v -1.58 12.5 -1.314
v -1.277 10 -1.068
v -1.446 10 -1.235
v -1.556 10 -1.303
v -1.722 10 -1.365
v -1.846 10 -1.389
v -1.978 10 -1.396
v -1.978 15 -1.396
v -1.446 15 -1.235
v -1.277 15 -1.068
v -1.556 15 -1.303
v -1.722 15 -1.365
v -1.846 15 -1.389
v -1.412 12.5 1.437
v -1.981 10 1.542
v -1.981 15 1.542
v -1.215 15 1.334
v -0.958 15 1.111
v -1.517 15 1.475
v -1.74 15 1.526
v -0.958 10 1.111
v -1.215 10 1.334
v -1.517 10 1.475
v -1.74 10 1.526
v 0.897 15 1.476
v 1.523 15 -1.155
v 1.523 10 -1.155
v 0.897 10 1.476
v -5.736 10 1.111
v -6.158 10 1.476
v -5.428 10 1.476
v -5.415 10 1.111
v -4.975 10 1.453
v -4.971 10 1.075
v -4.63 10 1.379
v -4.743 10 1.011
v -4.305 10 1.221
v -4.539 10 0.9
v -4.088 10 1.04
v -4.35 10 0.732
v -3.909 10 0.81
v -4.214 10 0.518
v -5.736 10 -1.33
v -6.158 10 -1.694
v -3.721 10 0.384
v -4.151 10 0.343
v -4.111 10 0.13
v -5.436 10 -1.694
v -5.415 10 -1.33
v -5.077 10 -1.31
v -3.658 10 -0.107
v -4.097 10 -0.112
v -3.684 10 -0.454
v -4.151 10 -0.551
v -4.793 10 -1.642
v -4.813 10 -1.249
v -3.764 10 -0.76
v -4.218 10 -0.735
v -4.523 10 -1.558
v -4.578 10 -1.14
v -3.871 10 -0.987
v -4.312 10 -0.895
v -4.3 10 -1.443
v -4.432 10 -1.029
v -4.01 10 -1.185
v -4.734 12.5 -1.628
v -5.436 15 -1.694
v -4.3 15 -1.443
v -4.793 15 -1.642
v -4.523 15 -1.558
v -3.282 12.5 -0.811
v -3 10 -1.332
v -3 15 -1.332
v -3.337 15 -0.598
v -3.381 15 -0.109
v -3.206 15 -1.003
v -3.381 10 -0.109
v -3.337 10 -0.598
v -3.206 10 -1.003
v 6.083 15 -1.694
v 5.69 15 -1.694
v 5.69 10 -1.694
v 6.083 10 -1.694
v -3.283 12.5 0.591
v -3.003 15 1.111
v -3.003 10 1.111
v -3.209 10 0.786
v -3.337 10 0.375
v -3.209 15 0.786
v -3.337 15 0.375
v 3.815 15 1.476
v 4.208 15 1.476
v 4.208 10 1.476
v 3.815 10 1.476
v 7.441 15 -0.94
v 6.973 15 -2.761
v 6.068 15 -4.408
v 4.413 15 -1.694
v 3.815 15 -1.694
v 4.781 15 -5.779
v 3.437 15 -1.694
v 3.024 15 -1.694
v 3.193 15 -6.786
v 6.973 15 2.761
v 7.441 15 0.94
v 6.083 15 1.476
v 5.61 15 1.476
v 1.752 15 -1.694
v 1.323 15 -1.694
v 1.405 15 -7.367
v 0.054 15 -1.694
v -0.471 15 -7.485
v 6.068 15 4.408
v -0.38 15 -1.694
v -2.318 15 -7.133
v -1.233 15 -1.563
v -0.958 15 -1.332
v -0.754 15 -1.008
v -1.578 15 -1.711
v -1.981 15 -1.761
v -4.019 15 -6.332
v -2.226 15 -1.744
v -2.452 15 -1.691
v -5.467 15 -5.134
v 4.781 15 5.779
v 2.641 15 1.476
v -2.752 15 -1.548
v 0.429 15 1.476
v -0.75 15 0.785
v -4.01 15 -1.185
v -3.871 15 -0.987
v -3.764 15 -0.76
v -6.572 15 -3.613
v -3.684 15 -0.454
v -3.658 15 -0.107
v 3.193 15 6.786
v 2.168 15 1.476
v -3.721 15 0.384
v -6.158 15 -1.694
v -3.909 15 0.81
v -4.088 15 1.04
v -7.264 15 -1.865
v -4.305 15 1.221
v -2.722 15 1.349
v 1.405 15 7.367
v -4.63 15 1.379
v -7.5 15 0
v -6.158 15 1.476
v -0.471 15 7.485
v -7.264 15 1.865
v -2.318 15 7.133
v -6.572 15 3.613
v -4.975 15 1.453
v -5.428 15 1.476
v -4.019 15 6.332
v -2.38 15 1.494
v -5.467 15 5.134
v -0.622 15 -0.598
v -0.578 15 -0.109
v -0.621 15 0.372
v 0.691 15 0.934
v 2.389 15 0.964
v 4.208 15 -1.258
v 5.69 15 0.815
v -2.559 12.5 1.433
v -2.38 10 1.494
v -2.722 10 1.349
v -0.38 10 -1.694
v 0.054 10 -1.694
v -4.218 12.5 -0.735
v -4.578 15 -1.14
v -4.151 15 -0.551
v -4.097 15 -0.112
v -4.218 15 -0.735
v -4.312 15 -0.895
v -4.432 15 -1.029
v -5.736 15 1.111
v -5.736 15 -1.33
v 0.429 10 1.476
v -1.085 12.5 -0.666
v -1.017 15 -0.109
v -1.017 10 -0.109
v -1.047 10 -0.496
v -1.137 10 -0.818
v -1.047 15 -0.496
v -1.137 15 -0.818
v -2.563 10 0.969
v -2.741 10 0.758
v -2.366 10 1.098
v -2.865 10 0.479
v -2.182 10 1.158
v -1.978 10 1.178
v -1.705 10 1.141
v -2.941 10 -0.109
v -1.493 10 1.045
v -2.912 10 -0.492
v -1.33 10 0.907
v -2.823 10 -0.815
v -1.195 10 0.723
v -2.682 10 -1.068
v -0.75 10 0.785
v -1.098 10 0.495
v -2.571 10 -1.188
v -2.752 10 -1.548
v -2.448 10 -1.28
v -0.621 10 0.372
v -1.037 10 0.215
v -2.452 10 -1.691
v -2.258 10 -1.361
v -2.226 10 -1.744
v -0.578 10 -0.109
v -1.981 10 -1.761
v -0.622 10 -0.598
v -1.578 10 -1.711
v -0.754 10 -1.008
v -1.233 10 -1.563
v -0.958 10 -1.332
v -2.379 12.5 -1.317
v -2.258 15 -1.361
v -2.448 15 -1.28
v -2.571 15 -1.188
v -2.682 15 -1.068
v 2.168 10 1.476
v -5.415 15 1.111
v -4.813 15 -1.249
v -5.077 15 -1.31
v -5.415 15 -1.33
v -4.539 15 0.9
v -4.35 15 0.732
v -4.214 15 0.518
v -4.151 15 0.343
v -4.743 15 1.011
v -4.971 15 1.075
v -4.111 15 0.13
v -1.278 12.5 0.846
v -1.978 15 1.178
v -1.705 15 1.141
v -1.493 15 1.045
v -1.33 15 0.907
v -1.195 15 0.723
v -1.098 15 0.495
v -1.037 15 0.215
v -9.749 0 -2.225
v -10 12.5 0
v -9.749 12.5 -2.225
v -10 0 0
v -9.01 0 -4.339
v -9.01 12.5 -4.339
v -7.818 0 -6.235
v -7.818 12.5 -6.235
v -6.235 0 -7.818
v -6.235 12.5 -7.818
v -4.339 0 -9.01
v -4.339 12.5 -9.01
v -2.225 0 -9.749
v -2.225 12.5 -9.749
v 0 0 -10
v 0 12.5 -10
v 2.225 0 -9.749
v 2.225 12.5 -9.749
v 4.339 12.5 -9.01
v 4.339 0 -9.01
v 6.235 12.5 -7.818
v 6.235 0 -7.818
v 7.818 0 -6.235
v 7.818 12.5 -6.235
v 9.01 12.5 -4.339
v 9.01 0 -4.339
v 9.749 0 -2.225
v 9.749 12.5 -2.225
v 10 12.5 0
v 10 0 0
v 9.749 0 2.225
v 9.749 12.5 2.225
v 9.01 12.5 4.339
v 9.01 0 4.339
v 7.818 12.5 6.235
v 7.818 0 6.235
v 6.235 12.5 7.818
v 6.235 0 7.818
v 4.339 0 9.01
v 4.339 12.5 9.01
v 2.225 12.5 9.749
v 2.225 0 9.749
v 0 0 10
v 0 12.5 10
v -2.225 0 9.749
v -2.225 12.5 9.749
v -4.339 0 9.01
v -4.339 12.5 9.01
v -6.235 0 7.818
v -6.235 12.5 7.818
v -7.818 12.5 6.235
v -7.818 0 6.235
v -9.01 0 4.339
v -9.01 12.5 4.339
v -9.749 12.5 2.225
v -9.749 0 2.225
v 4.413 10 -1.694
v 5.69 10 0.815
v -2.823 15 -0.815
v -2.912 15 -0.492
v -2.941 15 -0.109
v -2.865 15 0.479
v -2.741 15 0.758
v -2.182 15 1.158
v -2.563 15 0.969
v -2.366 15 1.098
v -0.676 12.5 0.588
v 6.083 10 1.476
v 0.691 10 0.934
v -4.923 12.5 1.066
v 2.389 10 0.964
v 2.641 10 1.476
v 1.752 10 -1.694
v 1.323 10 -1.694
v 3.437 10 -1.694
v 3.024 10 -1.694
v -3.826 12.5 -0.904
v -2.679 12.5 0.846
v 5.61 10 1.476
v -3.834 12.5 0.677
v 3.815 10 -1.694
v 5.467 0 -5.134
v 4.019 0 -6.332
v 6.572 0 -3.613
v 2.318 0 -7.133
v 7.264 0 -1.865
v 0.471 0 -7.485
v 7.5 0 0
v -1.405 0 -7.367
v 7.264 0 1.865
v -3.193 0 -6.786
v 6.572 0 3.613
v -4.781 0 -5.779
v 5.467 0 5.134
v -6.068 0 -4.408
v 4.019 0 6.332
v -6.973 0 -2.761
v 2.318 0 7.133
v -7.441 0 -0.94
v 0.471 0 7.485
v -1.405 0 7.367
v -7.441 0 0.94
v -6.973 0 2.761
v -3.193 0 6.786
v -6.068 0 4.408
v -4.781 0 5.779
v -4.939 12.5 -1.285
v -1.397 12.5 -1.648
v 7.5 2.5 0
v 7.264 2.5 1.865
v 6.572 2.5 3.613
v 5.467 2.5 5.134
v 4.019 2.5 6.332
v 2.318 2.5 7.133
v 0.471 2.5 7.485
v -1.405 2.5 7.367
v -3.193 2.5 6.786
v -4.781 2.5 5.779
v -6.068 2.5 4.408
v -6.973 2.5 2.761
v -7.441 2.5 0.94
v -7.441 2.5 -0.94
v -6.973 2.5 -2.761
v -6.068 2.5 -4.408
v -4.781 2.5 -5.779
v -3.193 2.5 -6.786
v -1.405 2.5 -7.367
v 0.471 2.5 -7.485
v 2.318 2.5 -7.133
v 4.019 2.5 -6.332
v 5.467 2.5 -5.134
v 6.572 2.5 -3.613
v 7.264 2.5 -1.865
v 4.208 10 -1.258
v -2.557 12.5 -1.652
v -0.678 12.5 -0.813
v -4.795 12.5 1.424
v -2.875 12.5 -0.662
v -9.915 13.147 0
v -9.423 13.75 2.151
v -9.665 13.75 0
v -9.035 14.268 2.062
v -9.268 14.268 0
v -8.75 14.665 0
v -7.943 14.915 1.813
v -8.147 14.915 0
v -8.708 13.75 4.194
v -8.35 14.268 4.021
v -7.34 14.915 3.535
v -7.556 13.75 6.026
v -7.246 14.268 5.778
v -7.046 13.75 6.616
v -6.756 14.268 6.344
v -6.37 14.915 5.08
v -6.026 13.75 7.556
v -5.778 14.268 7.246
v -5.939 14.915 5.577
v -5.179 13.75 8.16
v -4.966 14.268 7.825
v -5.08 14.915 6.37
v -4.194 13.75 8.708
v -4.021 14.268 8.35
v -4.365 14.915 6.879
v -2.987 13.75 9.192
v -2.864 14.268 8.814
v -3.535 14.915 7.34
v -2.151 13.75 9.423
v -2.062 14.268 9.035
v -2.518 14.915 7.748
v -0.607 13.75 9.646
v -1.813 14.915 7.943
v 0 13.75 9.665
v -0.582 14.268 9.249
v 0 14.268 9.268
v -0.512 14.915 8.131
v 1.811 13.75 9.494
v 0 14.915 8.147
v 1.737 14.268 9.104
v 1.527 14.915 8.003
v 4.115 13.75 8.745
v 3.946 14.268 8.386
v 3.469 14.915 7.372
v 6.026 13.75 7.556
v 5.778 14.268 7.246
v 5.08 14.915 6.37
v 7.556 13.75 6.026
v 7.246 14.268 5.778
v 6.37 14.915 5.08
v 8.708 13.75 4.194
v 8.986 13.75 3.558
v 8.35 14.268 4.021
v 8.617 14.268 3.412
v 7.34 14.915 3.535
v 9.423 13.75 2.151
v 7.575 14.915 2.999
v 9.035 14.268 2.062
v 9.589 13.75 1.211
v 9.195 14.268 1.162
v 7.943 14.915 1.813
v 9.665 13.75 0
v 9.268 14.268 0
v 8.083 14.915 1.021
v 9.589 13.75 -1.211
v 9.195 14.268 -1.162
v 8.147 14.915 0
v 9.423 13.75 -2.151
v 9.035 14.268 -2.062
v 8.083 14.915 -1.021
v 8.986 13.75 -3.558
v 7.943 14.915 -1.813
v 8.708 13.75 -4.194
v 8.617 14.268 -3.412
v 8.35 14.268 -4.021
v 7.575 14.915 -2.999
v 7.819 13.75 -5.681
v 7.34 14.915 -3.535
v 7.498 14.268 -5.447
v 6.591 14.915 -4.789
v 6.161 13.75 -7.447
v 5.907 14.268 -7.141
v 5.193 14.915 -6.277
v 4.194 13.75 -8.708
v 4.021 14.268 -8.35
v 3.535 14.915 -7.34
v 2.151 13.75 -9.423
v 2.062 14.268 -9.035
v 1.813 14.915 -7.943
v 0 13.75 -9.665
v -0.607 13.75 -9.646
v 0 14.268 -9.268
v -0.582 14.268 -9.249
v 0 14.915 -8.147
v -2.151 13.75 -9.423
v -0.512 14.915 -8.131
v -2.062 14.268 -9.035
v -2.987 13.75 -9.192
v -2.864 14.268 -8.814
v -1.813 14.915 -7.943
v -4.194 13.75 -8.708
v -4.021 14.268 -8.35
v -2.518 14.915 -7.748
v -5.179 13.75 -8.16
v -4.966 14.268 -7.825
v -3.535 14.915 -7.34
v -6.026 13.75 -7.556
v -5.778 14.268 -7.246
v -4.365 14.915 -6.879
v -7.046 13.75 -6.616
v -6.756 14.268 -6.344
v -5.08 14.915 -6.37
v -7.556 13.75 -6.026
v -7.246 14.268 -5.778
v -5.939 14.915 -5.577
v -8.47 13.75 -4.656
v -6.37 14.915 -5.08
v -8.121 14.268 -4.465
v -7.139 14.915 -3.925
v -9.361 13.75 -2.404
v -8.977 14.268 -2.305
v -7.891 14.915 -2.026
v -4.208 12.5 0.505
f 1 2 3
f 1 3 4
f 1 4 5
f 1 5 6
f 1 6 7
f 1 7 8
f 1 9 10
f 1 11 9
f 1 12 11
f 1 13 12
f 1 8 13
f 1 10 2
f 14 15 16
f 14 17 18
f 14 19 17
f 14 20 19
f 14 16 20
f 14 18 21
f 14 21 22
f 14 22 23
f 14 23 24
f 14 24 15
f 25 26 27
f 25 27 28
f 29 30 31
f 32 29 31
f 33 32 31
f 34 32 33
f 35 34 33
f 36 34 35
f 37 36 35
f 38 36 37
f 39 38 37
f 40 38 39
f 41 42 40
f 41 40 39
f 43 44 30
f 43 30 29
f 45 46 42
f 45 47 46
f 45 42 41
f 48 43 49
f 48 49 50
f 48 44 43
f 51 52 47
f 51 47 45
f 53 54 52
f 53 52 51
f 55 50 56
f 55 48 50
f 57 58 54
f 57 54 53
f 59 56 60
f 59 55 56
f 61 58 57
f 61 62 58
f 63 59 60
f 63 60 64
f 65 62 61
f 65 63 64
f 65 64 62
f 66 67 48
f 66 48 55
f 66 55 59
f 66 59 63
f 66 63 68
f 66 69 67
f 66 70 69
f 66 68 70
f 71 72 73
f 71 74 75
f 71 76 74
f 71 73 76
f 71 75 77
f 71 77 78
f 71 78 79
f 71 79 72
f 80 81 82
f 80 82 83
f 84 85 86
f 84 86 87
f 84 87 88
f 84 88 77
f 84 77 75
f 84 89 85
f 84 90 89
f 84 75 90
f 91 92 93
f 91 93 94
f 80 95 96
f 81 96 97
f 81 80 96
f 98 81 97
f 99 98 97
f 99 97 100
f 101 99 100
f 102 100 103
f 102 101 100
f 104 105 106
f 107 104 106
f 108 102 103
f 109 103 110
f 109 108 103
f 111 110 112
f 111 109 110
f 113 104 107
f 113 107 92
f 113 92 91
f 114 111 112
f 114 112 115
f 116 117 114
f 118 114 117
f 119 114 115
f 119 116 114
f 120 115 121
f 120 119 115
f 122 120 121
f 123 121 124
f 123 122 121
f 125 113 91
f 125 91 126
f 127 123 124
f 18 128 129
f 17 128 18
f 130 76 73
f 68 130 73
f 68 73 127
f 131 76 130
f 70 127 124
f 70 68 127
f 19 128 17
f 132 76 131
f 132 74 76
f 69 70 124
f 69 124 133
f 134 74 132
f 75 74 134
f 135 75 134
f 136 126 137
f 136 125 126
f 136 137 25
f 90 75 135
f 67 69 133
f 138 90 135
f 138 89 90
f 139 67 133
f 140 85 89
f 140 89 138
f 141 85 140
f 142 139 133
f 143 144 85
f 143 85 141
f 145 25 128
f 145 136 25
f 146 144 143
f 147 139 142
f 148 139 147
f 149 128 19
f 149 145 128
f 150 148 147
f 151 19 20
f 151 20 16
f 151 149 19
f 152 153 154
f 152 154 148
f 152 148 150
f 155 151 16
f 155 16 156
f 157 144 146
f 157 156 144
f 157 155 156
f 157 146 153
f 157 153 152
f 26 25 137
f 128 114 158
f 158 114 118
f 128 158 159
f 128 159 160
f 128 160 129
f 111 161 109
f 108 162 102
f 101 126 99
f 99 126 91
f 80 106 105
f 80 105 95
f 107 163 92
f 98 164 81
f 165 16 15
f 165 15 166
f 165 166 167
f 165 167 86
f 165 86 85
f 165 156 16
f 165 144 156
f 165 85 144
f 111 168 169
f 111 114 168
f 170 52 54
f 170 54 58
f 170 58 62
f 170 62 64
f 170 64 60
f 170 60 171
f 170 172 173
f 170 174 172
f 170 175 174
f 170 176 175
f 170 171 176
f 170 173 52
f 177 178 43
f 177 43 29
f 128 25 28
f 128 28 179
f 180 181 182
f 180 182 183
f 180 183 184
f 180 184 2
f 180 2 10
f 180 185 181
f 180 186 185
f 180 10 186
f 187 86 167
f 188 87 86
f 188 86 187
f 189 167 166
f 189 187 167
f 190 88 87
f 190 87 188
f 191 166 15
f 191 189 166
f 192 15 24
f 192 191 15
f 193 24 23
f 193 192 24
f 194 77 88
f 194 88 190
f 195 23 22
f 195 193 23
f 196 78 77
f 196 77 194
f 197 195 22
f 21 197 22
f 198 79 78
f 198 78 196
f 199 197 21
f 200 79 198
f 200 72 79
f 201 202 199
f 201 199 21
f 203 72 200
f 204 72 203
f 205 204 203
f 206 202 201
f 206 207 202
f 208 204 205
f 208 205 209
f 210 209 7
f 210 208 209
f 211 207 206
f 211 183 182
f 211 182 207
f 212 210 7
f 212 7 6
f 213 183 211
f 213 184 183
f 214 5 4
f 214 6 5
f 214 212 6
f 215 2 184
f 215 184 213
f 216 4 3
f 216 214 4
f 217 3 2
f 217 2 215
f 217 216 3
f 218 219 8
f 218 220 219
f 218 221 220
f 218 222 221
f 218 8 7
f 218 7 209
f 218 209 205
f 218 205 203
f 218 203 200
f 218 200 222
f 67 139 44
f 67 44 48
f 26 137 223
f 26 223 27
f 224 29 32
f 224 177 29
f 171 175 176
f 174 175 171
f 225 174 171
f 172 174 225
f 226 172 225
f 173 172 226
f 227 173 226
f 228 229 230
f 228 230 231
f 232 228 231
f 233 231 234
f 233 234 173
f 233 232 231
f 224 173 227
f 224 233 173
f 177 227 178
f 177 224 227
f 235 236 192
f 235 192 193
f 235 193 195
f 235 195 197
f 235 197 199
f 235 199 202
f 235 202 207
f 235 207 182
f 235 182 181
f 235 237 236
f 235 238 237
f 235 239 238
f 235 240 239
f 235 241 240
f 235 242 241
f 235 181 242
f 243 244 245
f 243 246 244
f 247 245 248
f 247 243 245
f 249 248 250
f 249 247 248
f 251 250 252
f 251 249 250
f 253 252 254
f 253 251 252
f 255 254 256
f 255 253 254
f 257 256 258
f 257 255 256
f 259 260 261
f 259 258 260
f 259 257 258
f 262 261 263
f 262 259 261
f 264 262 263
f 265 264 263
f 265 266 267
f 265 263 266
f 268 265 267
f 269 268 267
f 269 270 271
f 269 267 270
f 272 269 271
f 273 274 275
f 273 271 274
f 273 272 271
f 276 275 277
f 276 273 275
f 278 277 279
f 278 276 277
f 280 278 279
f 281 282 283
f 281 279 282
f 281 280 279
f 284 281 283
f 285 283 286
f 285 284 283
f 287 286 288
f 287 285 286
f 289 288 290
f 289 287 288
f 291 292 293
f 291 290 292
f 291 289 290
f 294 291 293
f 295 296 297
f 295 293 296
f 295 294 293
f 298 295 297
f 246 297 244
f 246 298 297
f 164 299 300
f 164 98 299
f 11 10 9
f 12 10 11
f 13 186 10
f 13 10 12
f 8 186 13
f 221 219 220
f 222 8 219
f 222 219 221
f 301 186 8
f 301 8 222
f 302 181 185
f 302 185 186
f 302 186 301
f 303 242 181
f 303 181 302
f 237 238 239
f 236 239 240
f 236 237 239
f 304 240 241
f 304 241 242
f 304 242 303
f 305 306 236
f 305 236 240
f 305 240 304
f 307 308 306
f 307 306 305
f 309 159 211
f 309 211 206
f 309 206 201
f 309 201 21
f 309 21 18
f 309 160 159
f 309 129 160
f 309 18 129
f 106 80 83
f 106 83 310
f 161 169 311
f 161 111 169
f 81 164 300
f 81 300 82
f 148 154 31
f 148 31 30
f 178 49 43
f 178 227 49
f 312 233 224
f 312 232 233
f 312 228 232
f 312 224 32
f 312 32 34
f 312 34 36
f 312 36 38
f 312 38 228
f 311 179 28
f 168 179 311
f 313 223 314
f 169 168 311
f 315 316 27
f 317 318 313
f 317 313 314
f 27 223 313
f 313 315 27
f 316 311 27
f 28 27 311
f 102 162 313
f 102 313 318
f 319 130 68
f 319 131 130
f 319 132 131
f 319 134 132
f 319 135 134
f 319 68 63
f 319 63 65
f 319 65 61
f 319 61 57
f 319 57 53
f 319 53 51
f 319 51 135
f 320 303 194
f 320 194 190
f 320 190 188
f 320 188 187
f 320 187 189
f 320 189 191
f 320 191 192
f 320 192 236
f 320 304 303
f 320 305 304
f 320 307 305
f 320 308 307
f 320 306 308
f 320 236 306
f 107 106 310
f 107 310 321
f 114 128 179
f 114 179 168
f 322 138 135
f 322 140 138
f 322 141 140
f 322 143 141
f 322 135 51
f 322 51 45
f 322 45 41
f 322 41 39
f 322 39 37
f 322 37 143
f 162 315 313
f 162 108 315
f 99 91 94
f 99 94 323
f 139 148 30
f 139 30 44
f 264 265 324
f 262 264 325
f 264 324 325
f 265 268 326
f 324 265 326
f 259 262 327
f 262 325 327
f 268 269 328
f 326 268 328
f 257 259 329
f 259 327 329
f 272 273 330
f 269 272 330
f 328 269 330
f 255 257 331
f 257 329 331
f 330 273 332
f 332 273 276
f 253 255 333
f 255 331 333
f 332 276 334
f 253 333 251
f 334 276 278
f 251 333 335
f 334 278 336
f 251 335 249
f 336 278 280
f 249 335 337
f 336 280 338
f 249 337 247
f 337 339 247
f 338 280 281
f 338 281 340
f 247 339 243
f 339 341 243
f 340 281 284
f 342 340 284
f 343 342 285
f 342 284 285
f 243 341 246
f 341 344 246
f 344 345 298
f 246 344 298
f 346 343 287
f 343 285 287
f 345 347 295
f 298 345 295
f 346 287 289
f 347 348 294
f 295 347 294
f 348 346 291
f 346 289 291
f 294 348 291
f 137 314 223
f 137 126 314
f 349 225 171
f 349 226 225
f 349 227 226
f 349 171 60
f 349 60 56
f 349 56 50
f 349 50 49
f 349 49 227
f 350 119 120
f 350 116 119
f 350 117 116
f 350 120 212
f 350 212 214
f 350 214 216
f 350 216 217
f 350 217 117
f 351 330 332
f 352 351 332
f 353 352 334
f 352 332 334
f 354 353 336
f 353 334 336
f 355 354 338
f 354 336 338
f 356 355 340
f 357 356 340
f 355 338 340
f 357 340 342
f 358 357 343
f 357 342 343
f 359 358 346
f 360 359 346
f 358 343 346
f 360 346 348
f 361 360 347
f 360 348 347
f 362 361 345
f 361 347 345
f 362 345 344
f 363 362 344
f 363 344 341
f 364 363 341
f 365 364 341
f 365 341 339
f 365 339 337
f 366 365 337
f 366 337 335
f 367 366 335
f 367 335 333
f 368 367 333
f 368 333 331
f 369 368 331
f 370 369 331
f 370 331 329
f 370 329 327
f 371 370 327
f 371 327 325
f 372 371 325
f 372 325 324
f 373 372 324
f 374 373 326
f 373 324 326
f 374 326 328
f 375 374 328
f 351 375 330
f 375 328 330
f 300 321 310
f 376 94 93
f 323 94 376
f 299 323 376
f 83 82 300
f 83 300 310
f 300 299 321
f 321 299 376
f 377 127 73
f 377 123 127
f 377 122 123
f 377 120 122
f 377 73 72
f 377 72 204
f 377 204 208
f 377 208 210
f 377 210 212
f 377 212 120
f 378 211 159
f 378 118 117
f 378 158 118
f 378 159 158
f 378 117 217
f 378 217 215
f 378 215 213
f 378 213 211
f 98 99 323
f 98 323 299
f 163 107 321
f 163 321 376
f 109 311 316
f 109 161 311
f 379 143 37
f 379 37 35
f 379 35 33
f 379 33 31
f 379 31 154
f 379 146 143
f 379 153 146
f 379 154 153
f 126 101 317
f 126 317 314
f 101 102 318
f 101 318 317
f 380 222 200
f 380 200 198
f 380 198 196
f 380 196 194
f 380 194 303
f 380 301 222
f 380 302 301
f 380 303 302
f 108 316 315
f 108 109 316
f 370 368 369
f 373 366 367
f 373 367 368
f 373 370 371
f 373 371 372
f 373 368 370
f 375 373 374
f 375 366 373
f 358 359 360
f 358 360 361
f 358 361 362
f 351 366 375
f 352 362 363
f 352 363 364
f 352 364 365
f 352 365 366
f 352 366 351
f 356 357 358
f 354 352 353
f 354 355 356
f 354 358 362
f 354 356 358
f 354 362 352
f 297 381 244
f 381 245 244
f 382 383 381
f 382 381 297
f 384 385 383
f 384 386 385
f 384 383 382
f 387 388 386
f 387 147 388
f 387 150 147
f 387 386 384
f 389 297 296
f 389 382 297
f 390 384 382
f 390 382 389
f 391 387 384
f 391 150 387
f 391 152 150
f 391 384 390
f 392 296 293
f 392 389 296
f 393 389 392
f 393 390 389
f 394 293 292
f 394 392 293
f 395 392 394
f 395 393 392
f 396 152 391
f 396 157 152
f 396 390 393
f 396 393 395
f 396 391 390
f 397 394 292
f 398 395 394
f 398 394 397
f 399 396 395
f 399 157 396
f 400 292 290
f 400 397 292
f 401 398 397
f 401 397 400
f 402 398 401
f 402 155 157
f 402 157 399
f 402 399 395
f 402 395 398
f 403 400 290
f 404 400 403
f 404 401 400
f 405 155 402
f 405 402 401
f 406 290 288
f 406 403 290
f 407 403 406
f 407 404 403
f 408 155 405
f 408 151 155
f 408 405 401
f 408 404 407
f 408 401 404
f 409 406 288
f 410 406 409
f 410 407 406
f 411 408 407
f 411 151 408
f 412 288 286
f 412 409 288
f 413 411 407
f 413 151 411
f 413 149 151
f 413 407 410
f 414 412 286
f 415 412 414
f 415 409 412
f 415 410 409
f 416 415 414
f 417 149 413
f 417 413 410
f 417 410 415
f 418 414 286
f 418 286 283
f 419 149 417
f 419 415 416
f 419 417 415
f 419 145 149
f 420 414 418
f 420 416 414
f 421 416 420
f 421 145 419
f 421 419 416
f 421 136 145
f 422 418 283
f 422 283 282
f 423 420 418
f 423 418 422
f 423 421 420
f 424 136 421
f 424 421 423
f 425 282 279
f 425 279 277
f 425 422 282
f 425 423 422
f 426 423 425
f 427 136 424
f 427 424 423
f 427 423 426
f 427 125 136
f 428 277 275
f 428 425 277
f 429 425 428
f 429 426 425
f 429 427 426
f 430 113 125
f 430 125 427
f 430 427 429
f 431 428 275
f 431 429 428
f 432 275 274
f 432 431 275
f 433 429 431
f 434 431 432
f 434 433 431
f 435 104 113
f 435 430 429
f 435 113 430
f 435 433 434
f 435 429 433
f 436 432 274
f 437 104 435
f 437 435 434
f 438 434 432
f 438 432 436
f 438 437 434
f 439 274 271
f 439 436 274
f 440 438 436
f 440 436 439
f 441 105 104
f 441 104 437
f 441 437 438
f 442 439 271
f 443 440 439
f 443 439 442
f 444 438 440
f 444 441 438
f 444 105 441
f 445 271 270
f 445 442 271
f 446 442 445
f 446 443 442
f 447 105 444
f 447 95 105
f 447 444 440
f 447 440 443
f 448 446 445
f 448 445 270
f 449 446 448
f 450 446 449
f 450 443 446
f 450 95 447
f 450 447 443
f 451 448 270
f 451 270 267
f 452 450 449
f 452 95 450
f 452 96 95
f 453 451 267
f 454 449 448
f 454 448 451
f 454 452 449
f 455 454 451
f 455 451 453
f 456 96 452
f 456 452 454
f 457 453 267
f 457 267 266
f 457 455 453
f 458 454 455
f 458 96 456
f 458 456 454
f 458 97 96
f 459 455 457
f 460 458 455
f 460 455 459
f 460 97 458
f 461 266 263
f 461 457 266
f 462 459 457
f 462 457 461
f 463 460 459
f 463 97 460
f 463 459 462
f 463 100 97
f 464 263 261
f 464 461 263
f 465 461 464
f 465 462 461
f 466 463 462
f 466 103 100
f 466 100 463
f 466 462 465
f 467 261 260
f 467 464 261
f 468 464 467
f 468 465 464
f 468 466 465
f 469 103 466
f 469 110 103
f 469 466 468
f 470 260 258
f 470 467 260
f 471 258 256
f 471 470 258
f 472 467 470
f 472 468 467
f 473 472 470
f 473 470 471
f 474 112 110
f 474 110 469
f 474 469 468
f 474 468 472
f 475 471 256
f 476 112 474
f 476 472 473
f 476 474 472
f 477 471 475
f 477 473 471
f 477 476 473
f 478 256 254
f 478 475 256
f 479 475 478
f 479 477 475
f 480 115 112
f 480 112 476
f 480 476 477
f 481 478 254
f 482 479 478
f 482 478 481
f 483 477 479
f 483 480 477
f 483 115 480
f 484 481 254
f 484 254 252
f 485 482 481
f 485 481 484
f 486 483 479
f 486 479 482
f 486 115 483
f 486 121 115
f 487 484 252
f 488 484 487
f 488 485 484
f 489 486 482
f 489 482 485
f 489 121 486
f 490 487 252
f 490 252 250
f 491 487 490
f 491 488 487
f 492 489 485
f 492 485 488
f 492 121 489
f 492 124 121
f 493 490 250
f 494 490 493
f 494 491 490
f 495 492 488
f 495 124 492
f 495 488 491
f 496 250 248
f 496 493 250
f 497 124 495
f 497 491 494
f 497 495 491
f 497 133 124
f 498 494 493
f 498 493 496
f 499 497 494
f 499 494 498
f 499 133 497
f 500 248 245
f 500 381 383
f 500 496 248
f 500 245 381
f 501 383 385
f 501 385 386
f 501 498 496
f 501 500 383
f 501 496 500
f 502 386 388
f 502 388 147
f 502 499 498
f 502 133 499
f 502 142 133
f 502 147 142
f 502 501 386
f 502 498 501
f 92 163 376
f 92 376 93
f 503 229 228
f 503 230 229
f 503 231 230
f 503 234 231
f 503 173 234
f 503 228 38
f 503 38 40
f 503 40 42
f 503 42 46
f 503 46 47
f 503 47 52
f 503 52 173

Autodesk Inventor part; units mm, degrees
ref_plane "YZ Plane" through (0, 0, 0) normal (1, 0, 0) x (0, 1, 0)
ref_plane "XZ Plane" through (0, 0, 0) normal (0, 1, 0) x (-1, 0, 0)
ref_plane "XY Plane" through (0, 0, 0) normal (0, 0, 1) x (1, 0, 0)
sketch "Sketch1" plane through (0, 0, 0) normal (0, 1, 0) x (-1, 0, 0)
  circle A0 centre (0, 0) radius 10
  dimension "d0" = 20
extrude "Extrusion1" add sketch "Sketch1" along normal blind 15
fillet "Fillet1" radius 2.5 1 edges at (10, 15, 0)
sketch "Sketch2" plane through (0, 15, 0) normal (0, 1, 0) x (1, 0, 0)
  line L0 (-6.4787, 1.7612) -> (2.2441, 1.7612) construction
  line L1 (2.2441, 1.7612) -> (2.2441, -4.757) construction
  line L2 (2.2441, -4.757) -> (-6.4787, -4.757) construction
  line L3 (-6.4787, -4.757) -> (-6.4787, 1.7612) construction
  spline S0 degree 2 poles (-3.658, 0.1068) (-3.658, -0.3273) (-4.01, -1.0261) (-4.3054, -1.2213) knots 0 0 0 1 2 2 2
  spline S1 degree 2 poles (-4.3054, -1.2213) (-4.5469, -1.3729) (-5.0427, -1.4756) (-5.428, -1.4756) knots 0 0 0 1 2 2 2
  line L4 (-5.428, -1.4756) -> (-6.1576, -1.4756)
  line L5 (-6.1576, -1.4756) -> (-6.1576, 1.6944)
  line L6 (-6.1576, 1.6944) -> (-5.4357, 1.6944)
  spline S2 degree 2 poles (-5.4357, 1.6944) (-4.9887, 1.6944) (-4.4801, 1.5608) (-4.3003, 1.4426) knots 0 0 0 1 2 2 2
  spline S3 degree 2 poles (-4.3003, 1.4426) (-3.9946, 1.2397) (-3.658, 0.5692) (-3.658, 0.1068) knots 0 0 0 1 2 2 2
  spline S4 degree 2 poles (-4.0973, 0.112) (-4.0973, 0.4767) (-4.3388, 0.9931) (-4.5777, 1.1395) knots 0 0 0 1 2 2 2
  spline S5 degree 2 poles (-4.5777, 1.1395) (-4.7472, 1.2397) (-5.13, 1.3296) (-5.4152, 1.3296) knots 0 0 0 1 2 2 2
  line L7 (-5.4152, 1.3296) -> (-5.7363, 1.3296)
  line L8 (-5.7363, 1.3296) -> (-5.7363, -1.1108)
  line L9 (-5.7363, -1.1108) -> (-5.4152, -1.1108)
  spline S6 degree 2 poles (-5.4152, -1.1108) (-5.1351, -1.1108) (-4.7113, -1.0209) (-4.5392, -0.9002) knots 0 0 0 1 2 2 2
  spline S7 degree 2 poles (-4.5392, -0.9002) (-4.3182, -0.7512) (-4.0973, -0.258) (-4.0973, 0.112) knots 0 0 0 1 2 2 2
  spline S8 degree 2 poles (-0.9581, 1.3322) (-0.7783, 1.1215) (-0.5779, 0.505) (-0.5779, 0.1094) knots 0 0 0 1 2 2 2
  spline S9 degree 2 poles (-0.5779, 0.1094) (-0.5779, -0.276) (-0.7732, -0.9002) (-0.9581, -1.1108) knots 0 0 0 1 2 2 2
  spline S10 degree 2 poles (-0.9581, -1.1108) (-1.1534, -1.3318) (-1.6697, -1.5424) (-1.9806, -1.5424) knots 0 0 0 1 2 2 2
  spline S11 degree 2 poles (-1.9806, -1.5424) (-2.3017, -1.5424) (-2.8154, -1.3241) (-3.003, -1.1108) knots 0 0 0 1 2 2 2
  spline S12 degree 2 poles (-3.003, -1.1108) (-3.1854, -0.9002) (-3.3806, -0.2811) (-3.3806, 0.1094) knots 0 0 0 1 2 2 2
  spline S13 degree 2 poles (-3.3806, 0.1094) (-3.3806, 0.5076) (-3.1828, 1.1138) (-3.0004, 1.3322) knots 0 0 0 1 2 2 2
  spline S14 degree 2 poles (-3.0004, 1.3322) (-2.8154, 1.5428) (-2.2991, 1.7612) (-1.9806, 1.7612) knots 0 0 0 1 2 2 2
  spline S15 degree 2 poles (-1.9806, 1.7612) (-1.6569, 1.7612) (-1.138, 1.5351) (-0.9581, 1.3322) knots 0 0 0 1 2 2 2
  spline S16 degree 2 poles (-1.0172, 0.1094) (-1.0172, 0.4228) (-1.1534, 0.9083) (-1.2767, 1.0676) knots 0 0 0 1 2 2 2
  spline S17 degree 2 poles (-1.2767, 1.0676) (-1.4026, 1.232) (-1.7571, 1.3964) (-1.978, 1.3964) knots 0 0 0 1 2 2 2
  spline S18 degree 2 poles (-1.978, 1.3964) (-2.2066, 1.3964) (-2.5508, 1.2371) (-2.6819, 1.0676) knots 0 0 0 1 2 2 2
  spline S19 degree 2 poles (-2.6819, 1.0676) (-2.8077, 0.9057) (-2.9413, 0.4176) (-2.9413, 0.1094) knots 0 0 0 1 2 2 2
  spline S20 degree 2 poles (-2.9413, 0.1094) (-2.9413, -0.5149) (-2.4173, -1.1776) (-1.978, -1.1776) knots 0 0 0 1 2 2 2
  spline S21 degree 2 poles (-1.978, -1.1776) (-1.5387, -1.1776) (-1.0172, -0.5149) (-1.0172, 0.1094) knots 0 0 0 1 2 2 2
  line L10 (3.4372, 1.6944) -> (2.6409, -1.4756)
  line L11 (2.6409, -1.4756) -> (2.1682, -1.4756)
  line L12 (2.1682, -1.4756) -> (1.5234, 1.1549)
  line L13 (1.5234, 1.1549) -> (0.8966, -1.4756)
  line L14 (0.8966, -1.4756) -> (0.4291, -1.4756)
  line L15 (0.4291, -1.4756) -> (-0.3801, 1.6944)
  line L16 (-0.3801, 1.6944) -> (0.054, 1.6944)
  line L17 (0.054, 1.6944) -> (0.6911, -0.9336)
  line L18 (0.6911, -0.9336) -> (1.323, 1.6944)
  line L19 (1.323, 1.6944) -> (1.752, 1.6944)
  line L20 (1.752, 1.6944) -> (2.3891, -0.9644)
  line L21 (2.3891, -0.9644) -> (3.0236, 1.6944)
  line L22 (3.0236, 1.6944) -> (3.4372, 1.6944)
  line L23 (6.0832, -1.4756) -> (5.6105, -1.4756)
  line L24 (5.6105, -1.4756) -> (4.2079, 1.2577)
  line L25 (4.2079, 1.2577) -> (4.2079, -1.4756)
  line L26 (4.2079, -1.4756) -> (3.8148, -1.4756)
  line L27 (3.8148, -1.4756) -> (3.8148, 1.6944)
  line L28 (3.8148, 1.6944) -> (4.4134, 1.6944)
  line L29 (4.4134, 1.6944) -> (5.6901, -0.8154)
  line L30 (5.6901, -0.8154) -> (5.6901, 1.6944)
  line L31 (5.6901, 1.6944) -> (6.0832, 1.6944)
  line L32 (6.0832, 1.6944) -> (6.0832, -1.4756)
  point P0 (0, 0)
extrude "Extrusion2" cut sketch "Sketch2" against normal blind 5
sketch "Sketch3" plane through (0, 0, 0) normal (0, -1, 0) x (1, 0, 0)
  circle A0 centre (0, 0) radius 7.5
extrude "Extrusion3" cut sketch "Sketch3" against normal blind 2.5
properties part number "DOWN Button"
